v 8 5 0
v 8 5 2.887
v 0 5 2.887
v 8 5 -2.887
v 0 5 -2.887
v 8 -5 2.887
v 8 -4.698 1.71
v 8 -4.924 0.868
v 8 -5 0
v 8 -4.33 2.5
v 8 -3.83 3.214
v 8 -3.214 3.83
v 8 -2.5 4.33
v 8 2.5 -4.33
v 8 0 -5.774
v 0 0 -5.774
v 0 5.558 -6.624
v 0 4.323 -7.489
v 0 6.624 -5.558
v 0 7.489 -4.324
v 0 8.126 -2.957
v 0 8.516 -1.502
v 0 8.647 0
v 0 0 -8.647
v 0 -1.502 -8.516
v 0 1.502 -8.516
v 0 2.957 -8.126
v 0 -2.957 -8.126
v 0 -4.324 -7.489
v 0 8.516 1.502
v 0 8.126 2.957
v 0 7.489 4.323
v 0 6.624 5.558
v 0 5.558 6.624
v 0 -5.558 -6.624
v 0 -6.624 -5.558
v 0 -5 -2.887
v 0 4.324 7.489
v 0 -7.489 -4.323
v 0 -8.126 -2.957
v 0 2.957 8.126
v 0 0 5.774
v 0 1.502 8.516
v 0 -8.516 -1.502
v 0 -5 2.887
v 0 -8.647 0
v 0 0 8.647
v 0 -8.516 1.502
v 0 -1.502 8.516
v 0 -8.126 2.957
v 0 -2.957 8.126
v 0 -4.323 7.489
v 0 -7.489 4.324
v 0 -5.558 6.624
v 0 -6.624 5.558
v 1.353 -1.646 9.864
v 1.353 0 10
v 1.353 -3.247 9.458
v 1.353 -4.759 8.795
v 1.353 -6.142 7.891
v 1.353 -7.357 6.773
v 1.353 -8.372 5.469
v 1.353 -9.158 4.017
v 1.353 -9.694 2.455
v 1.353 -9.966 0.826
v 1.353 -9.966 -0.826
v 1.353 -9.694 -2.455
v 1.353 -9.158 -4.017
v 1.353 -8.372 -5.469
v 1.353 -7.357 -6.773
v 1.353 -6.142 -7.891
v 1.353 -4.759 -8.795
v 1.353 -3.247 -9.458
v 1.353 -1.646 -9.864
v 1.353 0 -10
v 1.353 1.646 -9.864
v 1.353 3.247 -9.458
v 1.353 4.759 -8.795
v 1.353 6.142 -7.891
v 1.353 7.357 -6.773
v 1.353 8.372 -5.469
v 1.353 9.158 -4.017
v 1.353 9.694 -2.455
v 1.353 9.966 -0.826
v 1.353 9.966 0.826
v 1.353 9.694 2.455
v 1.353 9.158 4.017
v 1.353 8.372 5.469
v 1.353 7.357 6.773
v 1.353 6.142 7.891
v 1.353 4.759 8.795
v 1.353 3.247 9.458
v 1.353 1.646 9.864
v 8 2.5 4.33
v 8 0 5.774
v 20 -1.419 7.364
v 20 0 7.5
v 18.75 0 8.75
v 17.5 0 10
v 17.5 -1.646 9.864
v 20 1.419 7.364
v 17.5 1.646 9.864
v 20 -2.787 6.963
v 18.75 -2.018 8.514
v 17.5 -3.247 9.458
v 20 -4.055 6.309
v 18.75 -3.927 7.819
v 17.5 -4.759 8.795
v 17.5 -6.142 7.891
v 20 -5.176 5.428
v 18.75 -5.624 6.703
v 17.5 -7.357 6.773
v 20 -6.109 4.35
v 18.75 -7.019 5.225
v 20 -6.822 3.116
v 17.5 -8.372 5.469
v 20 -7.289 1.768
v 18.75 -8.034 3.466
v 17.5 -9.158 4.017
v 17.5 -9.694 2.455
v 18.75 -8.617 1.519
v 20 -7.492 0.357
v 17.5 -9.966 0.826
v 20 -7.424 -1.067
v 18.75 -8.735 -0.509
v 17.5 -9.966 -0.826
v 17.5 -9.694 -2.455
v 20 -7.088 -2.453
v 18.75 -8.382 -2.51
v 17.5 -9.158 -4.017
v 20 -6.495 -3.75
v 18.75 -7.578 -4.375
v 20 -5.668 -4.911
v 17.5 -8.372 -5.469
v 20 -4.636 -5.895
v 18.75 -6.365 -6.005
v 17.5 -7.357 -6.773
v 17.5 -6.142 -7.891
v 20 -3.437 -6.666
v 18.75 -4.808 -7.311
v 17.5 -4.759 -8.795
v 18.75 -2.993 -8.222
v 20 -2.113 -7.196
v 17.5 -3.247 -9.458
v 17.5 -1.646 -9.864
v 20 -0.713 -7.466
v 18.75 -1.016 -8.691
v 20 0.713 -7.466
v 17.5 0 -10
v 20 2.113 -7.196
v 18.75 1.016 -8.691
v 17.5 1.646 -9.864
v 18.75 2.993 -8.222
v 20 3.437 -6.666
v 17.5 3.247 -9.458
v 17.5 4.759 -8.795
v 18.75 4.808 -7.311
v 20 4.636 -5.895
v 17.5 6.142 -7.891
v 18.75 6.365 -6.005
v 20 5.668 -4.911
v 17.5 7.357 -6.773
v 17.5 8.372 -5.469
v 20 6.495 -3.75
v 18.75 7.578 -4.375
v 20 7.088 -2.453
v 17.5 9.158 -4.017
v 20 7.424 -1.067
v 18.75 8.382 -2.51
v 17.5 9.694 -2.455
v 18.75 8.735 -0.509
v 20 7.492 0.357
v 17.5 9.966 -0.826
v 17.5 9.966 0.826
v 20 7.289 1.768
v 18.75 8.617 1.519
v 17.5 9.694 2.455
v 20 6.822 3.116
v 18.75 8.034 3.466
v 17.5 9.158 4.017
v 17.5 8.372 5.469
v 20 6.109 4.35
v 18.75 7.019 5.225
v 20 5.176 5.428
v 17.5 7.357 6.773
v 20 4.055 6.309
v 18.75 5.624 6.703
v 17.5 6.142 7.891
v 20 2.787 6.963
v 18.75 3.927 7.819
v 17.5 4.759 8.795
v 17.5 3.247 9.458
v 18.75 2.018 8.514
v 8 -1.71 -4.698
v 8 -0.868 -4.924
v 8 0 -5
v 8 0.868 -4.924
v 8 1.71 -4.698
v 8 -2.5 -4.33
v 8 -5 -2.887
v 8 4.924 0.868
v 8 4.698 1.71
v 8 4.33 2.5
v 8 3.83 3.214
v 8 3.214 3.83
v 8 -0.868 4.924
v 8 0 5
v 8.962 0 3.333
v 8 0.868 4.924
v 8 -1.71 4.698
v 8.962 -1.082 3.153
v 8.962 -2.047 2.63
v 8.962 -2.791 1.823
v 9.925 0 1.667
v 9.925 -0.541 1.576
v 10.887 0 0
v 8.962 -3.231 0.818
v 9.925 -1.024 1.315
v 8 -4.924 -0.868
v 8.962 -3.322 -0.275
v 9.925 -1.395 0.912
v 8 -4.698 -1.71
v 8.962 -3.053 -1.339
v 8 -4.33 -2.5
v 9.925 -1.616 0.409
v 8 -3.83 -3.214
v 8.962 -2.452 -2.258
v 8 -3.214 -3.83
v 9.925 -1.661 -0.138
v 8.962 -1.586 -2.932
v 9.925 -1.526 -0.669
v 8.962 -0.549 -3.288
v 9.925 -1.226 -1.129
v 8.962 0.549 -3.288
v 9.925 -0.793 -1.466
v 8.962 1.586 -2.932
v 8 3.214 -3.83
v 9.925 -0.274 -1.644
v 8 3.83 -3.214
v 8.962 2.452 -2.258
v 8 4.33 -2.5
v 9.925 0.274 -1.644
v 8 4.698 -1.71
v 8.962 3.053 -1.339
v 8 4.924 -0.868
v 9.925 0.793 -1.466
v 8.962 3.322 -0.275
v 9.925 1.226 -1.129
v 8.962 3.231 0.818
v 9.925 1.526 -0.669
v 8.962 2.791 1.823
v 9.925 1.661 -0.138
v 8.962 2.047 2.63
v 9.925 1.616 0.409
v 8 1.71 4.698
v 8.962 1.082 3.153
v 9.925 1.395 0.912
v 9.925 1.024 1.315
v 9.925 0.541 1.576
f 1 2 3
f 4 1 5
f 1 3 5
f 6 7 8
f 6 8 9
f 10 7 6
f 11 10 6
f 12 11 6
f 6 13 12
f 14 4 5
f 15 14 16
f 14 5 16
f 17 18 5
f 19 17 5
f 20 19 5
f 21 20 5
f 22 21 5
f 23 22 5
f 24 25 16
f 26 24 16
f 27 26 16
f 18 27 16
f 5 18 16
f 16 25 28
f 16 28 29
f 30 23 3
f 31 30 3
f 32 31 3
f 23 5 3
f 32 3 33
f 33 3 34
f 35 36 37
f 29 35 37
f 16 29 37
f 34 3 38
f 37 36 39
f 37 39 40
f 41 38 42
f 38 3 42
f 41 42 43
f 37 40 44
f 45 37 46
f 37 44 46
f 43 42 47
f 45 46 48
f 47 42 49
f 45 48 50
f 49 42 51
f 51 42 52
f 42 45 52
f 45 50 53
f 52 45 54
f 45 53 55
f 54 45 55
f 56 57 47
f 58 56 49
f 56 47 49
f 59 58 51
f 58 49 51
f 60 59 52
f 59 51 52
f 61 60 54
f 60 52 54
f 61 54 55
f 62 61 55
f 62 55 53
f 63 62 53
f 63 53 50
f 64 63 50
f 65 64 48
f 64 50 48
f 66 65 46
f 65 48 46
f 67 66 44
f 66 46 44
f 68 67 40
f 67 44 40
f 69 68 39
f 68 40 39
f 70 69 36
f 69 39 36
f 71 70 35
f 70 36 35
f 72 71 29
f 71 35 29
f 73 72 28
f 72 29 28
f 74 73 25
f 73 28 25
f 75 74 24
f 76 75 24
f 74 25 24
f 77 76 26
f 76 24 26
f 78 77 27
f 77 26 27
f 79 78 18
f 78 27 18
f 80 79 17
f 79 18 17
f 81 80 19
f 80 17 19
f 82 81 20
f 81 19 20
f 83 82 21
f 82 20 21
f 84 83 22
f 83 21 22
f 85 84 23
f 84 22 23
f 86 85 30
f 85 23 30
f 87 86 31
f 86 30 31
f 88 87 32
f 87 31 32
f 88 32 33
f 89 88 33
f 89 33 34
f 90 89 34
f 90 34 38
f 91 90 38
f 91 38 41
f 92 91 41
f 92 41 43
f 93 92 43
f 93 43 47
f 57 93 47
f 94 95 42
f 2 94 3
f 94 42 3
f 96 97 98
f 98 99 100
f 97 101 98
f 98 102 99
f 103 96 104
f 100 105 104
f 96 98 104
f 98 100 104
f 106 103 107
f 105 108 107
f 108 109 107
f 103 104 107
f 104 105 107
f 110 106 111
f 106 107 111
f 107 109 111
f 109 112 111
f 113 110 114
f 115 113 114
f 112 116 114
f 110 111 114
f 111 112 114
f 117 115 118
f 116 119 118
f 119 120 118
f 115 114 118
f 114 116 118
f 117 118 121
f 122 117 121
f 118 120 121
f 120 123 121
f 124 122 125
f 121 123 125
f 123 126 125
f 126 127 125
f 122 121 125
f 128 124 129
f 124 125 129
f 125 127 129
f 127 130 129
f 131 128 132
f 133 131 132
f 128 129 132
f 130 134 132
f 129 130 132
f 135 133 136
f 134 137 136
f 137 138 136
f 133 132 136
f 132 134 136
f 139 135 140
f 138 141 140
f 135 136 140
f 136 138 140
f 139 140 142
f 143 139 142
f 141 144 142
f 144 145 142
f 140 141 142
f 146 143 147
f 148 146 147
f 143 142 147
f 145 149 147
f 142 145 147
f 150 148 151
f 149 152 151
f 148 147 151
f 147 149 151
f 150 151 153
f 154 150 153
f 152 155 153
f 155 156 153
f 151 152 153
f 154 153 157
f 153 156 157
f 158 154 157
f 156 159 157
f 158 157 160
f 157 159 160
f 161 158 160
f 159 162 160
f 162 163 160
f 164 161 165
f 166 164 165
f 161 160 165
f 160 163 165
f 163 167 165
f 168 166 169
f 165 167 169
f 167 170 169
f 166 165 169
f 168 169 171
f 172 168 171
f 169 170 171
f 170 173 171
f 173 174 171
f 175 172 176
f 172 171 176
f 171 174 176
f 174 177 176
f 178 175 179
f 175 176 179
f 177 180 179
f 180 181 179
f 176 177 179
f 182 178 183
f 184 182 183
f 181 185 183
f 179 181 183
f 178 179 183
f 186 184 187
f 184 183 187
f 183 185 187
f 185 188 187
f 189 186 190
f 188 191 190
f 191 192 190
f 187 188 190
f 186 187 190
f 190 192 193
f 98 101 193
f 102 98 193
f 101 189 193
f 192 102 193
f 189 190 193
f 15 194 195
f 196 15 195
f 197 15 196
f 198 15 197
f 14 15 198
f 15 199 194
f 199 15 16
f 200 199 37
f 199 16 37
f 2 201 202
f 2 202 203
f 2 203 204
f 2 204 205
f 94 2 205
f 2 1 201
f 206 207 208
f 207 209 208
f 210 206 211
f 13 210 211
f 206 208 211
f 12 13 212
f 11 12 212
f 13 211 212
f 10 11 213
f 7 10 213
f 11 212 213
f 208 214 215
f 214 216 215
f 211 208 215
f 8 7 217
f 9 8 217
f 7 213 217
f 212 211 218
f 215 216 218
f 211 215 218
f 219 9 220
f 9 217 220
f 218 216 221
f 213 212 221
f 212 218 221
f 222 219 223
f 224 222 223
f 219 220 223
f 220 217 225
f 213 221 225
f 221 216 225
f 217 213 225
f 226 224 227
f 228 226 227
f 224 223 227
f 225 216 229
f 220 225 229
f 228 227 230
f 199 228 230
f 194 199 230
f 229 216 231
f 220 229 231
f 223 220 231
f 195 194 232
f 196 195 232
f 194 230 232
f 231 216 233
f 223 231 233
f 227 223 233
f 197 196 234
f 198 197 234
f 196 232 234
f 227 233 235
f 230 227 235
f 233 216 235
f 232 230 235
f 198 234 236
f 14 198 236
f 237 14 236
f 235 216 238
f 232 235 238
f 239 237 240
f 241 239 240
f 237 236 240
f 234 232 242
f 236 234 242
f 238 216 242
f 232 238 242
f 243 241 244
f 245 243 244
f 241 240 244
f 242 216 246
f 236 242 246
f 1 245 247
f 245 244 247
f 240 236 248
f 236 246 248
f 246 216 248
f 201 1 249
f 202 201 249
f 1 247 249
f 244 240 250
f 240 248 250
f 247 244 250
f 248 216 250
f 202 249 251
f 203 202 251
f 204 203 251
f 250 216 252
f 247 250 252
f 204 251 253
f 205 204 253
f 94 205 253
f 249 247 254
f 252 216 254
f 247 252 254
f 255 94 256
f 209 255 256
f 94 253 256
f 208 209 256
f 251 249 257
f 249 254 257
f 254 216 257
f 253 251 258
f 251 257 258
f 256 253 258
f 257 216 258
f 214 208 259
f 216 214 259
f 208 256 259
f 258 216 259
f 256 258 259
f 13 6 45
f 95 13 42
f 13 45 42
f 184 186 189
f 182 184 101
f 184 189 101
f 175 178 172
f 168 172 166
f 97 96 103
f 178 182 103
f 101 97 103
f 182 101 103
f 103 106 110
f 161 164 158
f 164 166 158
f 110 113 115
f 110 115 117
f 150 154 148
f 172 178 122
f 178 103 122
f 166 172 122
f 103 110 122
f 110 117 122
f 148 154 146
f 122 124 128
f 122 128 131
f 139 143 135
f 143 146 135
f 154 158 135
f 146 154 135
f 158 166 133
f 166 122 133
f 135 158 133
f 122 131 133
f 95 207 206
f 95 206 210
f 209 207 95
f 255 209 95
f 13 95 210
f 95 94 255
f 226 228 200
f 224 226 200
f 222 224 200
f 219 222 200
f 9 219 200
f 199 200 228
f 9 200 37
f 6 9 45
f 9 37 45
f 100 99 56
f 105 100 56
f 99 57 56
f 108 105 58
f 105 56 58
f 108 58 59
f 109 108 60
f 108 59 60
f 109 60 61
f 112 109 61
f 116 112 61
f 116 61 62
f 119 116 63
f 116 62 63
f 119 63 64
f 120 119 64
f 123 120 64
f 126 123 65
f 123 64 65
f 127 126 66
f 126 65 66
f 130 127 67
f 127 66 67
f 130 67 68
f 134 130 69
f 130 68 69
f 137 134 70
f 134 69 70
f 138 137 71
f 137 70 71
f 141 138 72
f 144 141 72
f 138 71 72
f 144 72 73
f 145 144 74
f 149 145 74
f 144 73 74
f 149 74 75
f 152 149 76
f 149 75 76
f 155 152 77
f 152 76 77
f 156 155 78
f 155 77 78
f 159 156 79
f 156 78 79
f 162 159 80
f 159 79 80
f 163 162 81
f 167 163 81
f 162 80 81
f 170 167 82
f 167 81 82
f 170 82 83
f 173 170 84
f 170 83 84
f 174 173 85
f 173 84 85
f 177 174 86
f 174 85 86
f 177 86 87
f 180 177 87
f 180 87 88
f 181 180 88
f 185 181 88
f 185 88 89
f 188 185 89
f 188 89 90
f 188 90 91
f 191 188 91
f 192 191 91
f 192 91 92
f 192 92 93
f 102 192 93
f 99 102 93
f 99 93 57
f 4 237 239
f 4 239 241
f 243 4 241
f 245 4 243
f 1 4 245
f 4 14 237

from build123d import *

# Parameters (mm, degrees)
HEXAGONSOCKET_DEPTH = 8


with BuildPart() as part:
    # Sketch1 → Base (revolve)
    with BuildSketch(Plane.XY, mode=Mode.PRIVATE) as base_sk:
        Polygon((0, 0), (20, 0), (20, 7.5), (17.5, 10), (1.353, 10), (0, 8.647), align=None)
    revolve(base_sk.sketch.rotate(Axis((-10.745014543, 0, 0), (1, 0, 0)), 90), axis=Axis((-10.745014543, 0, 0), (1, 0, 0)))

    # Sketch2 → HexagonSocket (cut)
    with BuildSketch(Plane(origin=(0, -0.021932325, 0.010138848), x_dir=(0, 0, 1), z_dir=(-1, 0, 0))):
        Polygon((5.763363844, 0.021932325), (2.876612498, 5.021932325), (-2.896890194, 5.021932325), (-5.78364154, 0.021932325), (-2.896890194, -4.978067675), (2.876612498, -4.978067675), align=None)
    extrude(amount=-HEXAGONSOCKET_DEPTH, mode=Mode.SUBTRACT)

    # Sketch3 → Cut-Revolve1 (revolve, cut)
    with BuildSketch(Plane.XY, mode=Mode.PRIVATE) as cut_revolve1_sk:
        Polygon((8, 5), (10.886751346, 0), (8, 0), align=None)
    revolve(cut_revolve1_sk.sketch.rotate(Axis((-3.144113667, 0, 0), (1, 0, 0)), 90), axis=Axis((-3.144113667, 0, 0), (1, 0, 0)), mode=Mode.SUBTRACT)


solid = part.part
